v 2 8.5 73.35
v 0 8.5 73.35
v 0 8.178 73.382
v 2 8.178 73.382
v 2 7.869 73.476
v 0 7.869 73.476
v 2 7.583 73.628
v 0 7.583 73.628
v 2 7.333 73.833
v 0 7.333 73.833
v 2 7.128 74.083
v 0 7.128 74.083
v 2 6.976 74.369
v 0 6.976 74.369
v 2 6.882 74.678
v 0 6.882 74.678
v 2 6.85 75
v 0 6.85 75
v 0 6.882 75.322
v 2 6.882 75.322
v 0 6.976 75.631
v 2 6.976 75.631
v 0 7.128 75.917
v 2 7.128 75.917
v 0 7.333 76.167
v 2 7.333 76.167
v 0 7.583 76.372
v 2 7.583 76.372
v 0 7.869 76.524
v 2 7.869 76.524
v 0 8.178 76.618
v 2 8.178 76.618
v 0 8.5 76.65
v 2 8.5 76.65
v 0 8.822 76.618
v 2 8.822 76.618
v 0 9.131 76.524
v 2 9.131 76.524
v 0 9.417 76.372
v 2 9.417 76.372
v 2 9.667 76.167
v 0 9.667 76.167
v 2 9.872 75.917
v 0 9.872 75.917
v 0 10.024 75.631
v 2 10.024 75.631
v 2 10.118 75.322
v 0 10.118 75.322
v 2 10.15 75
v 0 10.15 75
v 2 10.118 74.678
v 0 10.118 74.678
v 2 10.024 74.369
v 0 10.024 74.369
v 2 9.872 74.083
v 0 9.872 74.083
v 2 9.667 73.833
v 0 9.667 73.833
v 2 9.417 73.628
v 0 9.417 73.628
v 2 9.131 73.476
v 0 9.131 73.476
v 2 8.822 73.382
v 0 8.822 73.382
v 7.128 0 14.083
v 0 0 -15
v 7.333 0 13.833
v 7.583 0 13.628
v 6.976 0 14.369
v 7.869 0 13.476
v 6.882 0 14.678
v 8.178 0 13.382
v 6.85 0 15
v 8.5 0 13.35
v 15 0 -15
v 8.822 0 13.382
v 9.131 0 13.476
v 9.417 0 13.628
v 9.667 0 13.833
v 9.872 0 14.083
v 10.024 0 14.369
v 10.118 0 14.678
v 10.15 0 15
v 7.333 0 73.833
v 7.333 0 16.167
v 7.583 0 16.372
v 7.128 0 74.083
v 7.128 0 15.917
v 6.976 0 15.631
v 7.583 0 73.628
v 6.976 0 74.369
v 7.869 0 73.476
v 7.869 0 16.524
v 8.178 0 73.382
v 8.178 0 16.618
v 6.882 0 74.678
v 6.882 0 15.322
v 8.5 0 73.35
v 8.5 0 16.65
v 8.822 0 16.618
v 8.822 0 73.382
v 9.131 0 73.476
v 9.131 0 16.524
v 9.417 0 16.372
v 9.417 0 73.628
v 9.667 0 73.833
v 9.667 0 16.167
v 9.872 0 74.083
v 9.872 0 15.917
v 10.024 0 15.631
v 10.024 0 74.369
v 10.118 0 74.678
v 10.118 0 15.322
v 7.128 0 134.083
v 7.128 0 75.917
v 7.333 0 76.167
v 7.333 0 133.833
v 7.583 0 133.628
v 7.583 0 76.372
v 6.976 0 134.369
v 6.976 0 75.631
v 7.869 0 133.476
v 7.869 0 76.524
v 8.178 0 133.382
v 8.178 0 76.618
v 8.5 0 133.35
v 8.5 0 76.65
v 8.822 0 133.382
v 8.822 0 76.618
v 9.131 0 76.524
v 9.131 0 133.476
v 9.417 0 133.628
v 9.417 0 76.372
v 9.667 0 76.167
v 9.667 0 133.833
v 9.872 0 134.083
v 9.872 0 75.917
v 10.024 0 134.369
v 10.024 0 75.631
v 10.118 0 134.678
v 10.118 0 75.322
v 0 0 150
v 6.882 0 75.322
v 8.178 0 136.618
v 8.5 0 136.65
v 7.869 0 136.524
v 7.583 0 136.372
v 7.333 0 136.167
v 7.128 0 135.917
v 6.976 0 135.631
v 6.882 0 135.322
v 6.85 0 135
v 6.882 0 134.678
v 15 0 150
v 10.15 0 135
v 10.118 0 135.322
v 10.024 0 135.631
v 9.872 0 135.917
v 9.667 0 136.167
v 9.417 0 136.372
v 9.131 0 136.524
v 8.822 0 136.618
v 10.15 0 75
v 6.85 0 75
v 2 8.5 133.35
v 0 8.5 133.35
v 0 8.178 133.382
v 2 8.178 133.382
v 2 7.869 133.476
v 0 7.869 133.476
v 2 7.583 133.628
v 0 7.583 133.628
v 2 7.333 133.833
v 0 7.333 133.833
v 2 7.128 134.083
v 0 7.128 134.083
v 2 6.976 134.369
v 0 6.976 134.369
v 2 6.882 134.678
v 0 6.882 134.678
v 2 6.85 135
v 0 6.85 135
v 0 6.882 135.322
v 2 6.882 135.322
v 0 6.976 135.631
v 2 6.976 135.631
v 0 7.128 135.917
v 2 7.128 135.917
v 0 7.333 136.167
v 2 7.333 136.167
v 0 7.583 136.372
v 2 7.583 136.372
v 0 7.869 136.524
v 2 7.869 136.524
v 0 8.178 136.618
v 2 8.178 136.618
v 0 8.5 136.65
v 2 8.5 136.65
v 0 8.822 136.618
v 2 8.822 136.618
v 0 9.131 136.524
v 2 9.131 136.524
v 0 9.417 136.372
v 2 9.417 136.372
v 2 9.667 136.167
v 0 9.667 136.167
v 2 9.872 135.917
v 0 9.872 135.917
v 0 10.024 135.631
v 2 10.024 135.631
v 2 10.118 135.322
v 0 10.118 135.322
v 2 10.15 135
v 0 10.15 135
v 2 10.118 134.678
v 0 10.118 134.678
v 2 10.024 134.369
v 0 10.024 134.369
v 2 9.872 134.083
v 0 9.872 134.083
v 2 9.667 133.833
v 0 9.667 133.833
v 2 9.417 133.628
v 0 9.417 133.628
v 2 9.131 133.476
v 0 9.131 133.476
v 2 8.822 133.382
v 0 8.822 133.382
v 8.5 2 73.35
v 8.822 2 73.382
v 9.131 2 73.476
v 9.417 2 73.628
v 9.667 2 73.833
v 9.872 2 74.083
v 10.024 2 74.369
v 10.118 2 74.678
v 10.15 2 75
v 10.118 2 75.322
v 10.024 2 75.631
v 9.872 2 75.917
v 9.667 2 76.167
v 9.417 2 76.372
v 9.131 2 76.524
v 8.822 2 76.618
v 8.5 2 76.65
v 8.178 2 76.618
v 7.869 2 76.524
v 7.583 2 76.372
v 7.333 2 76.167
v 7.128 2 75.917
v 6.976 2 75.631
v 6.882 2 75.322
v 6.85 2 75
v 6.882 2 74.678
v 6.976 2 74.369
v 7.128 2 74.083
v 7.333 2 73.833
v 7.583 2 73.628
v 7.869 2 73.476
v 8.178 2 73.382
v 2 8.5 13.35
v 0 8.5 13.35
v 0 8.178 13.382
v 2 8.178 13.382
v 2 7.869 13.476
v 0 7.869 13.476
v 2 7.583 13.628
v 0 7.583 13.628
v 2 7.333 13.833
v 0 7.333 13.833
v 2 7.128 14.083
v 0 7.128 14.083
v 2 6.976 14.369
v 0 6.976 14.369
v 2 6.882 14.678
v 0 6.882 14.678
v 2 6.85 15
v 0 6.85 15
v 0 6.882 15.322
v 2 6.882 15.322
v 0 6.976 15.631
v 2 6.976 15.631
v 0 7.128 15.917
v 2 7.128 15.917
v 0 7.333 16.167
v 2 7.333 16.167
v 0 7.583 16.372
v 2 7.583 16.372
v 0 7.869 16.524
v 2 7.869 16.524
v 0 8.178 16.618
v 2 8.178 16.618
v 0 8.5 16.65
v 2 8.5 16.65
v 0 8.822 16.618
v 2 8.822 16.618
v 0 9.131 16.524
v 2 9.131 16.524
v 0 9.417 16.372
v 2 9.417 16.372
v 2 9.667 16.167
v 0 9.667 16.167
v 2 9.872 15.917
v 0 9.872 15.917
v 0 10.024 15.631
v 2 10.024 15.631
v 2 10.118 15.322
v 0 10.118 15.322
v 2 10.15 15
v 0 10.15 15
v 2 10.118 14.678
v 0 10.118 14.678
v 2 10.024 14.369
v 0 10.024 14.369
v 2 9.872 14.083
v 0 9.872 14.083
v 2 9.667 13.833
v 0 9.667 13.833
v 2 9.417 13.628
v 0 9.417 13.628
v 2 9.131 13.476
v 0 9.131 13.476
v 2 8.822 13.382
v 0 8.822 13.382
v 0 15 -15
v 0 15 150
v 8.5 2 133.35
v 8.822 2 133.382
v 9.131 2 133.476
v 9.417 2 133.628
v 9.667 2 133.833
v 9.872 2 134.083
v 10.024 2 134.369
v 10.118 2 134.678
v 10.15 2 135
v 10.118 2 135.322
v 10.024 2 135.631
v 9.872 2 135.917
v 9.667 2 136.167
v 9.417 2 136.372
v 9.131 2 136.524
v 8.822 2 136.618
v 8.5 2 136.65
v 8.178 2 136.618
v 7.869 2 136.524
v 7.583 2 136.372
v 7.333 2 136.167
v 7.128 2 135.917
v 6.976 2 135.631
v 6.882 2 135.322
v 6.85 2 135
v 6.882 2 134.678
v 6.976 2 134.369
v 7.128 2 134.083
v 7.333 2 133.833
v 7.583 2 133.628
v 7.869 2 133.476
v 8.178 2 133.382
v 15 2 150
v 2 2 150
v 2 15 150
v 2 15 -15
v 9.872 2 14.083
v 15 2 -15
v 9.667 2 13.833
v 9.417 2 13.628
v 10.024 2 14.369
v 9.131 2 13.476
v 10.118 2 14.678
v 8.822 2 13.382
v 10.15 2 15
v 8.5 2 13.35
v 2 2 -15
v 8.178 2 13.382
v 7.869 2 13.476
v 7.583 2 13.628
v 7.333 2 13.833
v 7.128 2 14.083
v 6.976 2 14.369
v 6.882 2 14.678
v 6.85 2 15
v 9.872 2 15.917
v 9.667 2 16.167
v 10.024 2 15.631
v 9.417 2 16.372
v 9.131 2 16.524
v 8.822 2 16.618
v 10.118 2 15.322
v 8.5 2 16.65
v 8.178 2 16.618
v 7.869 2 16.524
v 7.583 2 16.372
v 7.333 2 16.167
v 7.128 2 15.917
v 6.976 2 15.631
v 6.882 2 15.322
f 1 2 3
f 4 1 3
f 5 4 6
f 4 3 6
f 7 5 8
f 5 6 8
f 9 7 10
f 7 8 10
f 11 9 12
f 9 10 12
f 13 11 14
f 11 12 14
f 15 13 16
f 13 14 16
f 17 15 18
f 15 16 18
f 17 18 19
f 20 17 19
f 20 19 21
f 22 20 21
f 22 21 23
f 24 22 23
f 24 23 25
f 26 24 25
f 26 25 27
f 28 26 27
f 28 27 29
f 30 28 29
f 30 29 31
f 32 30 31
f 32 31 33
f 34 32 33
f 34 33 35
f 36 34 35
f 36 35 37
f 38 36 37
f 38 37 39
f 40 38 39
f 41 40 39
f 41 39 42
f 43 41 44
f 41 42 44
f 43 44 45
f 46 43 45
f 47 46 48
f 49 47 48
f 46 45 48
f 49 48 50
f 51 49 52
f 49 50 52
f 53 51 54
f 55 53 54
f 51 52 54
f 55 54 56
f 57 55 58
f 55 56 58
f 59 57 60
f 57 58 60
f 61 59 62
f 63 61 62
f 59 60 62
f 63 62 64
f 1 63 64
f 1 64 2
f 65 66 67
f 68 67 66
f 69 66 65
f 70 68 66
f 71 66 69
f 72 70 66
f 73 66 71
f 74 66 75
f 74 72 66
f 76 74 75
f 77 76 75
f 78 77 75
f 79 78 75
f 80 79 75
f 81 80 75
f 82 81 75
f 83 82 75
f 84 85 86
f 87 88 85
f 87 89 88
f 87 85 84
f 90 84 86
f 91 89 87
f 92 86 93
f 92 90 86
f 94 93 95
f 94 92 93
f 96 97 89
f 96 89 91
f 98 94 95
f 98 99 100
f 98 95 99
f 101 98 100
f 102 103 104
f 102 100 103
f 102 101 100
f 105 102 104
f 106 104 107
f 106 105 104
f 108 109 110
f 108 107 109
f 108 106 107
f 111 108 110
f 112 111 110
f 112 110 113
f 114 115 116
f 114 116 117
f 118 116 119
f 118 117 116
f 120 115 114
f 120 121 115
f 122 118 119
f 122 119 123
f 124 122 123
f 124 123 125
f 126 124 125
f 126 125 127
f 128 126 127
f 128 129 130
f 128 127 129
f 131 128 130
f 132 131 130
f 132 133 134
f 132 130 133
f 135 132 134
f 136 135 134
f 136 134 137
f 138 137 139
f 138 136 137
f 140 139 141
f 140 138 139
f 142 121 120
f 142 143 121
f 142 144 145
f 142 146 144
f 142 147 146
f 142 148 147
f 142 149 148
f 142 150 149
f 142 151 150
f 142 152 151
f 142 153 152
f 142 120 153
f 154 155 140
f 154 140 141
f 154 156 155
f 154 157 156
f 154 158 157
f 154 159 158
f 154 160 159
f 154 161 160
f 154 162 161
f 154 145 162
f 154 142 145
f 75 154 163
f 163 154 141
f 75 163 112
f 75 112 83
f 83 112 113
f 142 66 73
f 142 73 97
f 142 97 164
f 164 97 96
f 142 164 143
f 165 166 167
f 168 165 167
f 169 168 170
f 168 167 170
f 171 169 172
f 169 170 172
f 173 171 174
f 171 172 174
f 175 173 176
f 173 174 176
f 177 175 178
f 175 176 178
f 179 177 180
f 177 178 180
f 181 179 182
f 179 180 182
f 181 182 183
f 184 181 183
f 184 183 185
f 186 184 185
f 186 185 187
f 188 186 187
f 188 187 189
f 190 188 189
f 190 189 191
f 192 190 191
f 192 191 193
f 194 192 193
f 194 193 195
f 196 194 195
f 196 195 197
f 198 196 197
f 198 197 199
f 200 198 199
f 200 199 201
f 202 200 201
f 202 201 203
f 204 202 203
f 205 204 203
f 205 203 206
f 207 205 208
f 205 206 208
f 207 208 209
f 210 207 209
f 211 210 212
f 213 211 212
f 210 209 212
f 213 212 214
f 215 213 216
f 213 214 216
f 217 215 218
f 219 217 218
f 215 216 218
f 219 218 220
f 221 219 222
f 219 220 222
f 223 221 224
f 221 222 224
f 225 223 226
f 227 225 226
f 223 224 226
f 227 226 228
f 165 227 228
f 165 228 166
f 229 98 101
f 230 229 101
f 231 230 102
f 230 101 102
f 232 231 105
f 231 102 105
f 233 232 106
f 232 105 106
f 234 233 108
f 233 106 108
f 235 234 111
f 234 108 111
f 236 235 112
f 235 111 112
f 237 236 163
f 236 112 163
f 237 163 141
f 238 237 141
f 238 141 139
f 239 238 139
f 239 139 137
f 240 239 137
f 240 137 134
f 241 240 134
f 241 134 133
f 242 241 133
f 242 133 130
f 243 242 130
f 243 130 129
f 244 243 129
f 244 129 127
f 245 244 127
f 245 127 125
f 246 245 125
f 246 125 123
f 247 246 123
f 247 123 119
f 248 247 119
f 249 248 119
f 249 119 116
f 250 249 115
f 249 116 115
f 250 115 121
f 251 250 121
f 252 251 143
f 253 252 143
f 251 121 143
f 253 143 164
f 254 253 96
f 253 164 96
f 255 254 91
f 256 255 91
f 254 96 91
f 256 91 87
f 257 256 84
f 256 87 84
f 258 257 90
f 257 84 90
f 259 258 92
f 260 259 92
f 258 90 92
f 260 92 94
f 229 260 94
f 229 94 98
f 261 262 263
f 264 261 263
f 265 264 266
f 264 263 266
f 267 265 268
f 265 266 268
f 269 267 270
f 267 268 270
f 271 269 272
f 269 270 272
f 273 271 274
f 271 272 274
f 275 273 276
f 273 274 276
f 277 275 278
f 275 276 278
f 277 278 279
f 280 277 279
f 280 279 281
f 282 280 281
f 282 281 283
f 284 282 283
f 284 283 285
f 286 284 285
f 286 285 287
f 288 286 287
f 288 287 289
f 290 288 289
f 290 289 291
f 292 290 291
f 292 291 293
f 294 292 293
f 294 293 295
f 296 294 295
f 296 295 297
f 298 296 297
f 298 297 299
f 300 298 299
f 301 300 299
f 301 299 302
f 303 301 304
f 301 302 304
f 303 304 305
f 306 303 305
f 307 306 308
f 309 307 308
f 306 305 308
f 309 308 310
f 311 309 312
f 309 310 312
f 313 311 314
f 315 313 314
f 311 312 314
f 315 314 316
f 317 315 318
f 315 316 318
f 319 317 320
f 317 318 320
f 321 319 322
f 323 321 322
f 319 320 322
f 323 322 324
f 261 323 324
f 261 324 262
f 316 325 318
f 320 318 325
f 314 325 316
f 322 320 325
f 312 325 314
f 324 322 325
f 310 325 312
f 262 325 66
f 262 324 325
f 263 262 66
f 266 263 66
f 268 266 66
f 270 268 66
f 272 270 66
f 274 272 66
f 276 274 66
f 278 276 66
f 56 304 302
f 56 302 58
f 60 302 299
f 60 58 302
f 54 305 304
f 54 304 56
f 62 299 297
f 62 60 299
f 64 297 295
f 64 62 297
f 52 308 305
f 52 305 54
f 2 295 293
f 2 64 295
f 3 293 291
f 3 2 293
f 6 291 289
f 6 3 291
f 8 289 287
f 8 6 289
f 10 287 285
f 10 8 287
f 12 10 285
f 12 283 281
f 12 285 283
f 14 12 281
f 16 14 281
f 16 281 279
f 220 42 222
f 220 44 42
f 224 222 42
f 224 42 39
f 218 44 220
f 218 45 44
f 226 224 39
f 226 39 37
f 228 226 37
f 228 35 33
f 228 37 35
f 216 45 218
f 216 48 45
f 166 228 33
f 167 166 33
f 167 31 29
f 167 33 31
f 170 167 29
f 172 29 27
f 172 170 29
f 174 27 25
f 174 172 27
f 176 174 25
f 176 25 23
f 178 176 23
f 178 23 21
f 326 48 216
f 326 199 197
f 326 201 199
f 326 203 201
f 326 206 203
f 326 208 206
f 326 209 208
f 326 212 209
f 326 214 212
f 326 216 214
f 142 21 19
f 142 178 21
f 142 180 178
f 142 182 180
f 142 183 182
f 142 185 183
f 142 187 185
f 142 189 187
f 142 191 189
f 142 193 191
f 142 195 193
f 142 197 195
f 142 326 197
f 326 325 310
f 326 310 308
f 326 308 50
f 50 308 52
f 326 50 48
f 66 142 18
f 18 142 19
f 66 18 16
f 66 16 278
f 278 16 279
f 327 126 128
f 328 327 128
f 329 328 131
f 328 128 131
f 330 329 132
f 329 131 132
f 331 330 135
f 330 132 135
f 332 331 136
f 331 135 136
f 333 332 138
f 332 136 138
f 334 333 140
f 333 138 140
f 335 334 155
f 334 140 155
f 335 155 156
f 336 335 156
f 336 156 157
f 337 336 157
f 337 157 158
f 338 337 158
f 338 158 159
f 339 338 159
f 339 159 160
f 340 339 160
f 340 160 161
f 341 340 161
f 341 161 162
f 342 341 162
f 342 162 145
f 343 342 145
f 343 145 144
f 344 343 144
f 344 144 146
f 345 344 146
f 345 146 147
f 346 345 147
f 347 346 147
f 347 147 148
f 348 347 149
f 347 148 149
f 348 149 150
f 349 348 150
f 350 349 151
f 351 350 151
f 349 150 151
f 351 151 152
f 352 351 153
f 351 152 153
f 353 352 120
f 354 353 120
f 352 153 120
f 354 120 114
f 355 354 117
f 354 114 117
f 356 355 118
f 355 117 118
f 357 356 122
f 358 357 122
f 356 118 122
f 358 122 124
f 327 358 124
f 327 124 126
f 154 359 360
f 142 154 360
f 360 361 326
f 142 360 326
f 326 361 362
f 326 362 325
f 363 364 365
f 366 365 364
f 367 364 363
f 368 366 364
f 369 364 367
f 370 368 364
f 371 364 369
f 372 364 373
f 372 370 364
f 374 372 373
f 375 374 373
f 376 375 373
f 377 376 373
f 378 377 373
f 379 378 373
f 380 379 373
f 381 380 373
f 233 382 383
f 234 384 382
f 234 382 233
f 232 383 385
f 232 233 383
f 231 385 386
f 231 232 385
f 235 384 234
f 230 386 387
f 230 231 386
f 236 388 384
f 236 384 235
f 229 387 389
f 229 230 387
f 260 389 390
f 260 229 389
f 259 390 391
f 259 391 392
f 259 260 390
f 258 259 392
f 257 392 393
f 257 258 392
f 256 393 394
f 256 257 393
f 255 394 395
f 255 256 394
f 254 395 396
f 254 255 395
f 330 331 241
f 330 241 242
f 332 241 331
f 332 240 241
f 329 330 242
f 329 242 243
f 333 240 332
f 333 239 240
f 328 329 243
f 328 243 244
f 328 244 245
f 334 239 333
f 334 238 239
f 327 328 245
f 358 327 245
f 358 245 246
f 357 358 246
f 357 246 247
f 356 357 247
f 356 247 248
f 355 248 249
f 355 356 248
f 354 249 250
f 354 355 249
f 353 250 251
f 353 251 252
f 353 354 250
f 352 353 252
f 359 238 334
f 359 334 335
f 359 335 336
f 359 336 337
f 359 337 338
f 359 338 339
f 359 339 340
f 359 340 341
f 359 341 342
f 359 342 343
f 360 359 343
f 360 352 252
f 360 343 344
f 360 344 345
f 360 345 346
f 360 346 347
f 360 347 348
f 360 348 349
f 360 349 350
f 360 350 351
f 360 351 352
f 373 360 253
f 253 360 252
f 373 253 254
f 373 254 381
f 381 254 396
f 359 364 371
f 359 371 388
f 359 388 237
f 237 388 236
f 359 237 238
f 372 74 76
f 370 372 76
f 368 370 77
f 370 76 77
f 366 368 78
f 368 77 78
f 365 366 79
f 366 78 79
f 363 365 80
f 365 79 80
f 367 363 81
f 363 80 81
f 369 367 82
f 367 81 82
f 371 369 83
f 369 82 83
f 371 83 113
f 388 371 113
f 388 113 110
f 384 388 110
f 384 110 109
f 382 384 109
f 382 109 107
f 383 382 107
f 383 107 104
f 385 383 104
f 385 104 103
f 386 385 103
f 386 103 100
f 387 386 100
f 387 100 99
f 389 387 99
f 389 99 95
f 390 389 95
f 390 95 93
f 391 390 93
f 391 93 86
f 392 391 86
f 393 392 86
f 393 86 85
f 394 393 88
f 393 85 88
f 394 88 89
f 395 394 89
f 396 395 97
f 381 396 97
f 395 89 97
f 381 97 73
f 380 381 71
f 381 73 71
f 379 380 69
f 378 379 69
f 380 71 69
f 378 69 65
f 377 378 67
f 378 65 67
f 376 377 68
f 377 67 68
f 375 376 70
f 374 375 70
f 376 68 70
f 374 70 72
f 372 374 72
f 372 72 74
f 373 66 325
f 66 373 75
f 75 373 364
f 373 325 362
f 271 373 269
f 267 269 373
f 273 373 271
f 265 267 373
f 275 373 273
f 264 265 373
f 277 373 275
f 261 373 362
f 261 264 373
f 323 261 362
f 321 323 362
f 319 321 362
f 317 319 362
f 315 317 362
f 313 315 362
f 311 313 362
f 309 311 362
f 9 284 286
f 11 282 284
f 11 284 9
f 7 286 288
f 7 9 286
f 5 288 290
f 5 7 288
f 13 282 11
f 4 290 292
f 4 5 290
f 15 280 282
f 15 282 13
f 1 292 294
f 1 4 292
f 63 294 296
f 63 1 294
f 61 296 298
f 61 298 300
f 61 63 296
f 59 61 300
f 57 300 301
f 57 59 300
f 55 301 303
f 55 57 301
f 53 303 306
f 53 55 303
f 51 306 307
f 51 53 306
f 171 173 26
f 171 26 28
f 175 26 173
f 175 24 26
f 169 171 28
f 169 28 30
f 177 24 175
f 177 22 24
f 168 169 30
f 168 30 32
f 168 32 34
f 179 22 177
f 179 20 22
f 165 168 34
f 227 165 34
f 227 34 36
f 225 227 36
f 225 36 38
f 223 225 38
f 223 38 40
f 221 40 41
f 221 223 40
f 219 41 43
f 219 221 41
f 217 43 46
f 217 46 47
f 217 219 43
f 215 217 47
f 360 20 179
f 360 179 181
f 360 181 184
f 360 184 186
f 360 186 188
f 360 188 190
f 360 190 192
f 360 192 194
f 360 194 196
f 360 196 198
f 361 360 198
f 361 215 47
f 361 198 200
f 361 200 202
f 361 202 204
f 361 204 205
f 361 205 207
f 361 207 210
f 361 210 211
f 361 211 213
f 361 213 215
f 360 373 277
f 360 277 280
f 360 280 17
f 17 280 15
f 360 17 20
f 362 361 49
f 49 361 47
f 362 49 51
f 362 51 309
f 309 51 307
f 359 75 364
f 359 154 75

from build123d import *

# Parameters (mm, degrees)
EXTRUDE_1_DEPTH          = 150
EXTRUDE_2_DEPTH          = 15
M4X0_7_1_D               = 3.3
M4X0_7_1_DEPTH           = 11.5
M4X0_7_1_TIP             = 0.991420021
M4X0_7_1_ON_FACE_2_D     = 3.3
M4X0_7_1_ON_FACE_2_DEPTH = 11.5
M4X0_7_1_ON_FACE_2_TIP   = 0.991420021


with BuildPart() as part:
    # ｽｹｯﾁ1 → ﾎﾞｽ - 押し出し1 (new body)
    with BuildSketch(Plane.XY):
        Polygon((0, 0), (0, 15), (2, 15), (2, 2), (15, 2), (15, 0), align=None)
    extrude(amount=EXTRUDE_1_DEPTH)

    # ｽｹｯﾁ7 → ﾎﾞｽ - 押し出し2 (add)
    with BuildSketch(Plane(origin=(0, 0, 0), x_dir=(-1, 0, 0), z_dir=(0, 0, -1))):
        Polygon((-15, 2), (-2, 2), (-2, 15), (0, 15), (0, 0), (-15, 0), align=None)
    extrude(amount=EXTRUDE_2_DEPTH)

    # M4x0.7 ねじ穴1
    with Locations(Plane(origin=(8.5, 2, 15), x_dir=(0, 0, 1), z_dir=(0, 1, 0))):
        with Locations((0, 0), (60, 0), (120, 0)):
            Hole(M4X0_7_1_D / 2, depth=M4X0_7_1_DEPTH)
            with Locations((0, 0, -(M4X0_7_1_DEPTH + M4X0_7_1_TIP / 2))):  # 118° drill point
                Cone(0, M4X0_7_1_D / 2, M4X0_7_1_TIP, mode=Mode.SUBTRACT)

    # M4x0.7 ねじ穴1 on face 2
    with Locations(Plane(origin=(2, 8.5, 135), x_dir=(0, 0, 1), z_dir=(1, 0, 0))):
        with Locations((0, 0), (-60, 0), (-120, 0)):
            Hole(M4X0_7_1_ON_FACE_2_D / 2, depth=M4X0_7_1_ON_FACE_2_DEPTH)
            with Locations((0, 0, -(M4X0_7_1_ON_FACE_2_DEPTH + M4X0_7_1_ON_FACE_2_TIP / 2))):  # 118° drill point
                Cone(0, M4X0_7_1_ON_FACE_2_D / 2, M4X0_7_1_ON_FACE_2_TIP, mode=Mode.SUBTRACT)


solid = part.part
